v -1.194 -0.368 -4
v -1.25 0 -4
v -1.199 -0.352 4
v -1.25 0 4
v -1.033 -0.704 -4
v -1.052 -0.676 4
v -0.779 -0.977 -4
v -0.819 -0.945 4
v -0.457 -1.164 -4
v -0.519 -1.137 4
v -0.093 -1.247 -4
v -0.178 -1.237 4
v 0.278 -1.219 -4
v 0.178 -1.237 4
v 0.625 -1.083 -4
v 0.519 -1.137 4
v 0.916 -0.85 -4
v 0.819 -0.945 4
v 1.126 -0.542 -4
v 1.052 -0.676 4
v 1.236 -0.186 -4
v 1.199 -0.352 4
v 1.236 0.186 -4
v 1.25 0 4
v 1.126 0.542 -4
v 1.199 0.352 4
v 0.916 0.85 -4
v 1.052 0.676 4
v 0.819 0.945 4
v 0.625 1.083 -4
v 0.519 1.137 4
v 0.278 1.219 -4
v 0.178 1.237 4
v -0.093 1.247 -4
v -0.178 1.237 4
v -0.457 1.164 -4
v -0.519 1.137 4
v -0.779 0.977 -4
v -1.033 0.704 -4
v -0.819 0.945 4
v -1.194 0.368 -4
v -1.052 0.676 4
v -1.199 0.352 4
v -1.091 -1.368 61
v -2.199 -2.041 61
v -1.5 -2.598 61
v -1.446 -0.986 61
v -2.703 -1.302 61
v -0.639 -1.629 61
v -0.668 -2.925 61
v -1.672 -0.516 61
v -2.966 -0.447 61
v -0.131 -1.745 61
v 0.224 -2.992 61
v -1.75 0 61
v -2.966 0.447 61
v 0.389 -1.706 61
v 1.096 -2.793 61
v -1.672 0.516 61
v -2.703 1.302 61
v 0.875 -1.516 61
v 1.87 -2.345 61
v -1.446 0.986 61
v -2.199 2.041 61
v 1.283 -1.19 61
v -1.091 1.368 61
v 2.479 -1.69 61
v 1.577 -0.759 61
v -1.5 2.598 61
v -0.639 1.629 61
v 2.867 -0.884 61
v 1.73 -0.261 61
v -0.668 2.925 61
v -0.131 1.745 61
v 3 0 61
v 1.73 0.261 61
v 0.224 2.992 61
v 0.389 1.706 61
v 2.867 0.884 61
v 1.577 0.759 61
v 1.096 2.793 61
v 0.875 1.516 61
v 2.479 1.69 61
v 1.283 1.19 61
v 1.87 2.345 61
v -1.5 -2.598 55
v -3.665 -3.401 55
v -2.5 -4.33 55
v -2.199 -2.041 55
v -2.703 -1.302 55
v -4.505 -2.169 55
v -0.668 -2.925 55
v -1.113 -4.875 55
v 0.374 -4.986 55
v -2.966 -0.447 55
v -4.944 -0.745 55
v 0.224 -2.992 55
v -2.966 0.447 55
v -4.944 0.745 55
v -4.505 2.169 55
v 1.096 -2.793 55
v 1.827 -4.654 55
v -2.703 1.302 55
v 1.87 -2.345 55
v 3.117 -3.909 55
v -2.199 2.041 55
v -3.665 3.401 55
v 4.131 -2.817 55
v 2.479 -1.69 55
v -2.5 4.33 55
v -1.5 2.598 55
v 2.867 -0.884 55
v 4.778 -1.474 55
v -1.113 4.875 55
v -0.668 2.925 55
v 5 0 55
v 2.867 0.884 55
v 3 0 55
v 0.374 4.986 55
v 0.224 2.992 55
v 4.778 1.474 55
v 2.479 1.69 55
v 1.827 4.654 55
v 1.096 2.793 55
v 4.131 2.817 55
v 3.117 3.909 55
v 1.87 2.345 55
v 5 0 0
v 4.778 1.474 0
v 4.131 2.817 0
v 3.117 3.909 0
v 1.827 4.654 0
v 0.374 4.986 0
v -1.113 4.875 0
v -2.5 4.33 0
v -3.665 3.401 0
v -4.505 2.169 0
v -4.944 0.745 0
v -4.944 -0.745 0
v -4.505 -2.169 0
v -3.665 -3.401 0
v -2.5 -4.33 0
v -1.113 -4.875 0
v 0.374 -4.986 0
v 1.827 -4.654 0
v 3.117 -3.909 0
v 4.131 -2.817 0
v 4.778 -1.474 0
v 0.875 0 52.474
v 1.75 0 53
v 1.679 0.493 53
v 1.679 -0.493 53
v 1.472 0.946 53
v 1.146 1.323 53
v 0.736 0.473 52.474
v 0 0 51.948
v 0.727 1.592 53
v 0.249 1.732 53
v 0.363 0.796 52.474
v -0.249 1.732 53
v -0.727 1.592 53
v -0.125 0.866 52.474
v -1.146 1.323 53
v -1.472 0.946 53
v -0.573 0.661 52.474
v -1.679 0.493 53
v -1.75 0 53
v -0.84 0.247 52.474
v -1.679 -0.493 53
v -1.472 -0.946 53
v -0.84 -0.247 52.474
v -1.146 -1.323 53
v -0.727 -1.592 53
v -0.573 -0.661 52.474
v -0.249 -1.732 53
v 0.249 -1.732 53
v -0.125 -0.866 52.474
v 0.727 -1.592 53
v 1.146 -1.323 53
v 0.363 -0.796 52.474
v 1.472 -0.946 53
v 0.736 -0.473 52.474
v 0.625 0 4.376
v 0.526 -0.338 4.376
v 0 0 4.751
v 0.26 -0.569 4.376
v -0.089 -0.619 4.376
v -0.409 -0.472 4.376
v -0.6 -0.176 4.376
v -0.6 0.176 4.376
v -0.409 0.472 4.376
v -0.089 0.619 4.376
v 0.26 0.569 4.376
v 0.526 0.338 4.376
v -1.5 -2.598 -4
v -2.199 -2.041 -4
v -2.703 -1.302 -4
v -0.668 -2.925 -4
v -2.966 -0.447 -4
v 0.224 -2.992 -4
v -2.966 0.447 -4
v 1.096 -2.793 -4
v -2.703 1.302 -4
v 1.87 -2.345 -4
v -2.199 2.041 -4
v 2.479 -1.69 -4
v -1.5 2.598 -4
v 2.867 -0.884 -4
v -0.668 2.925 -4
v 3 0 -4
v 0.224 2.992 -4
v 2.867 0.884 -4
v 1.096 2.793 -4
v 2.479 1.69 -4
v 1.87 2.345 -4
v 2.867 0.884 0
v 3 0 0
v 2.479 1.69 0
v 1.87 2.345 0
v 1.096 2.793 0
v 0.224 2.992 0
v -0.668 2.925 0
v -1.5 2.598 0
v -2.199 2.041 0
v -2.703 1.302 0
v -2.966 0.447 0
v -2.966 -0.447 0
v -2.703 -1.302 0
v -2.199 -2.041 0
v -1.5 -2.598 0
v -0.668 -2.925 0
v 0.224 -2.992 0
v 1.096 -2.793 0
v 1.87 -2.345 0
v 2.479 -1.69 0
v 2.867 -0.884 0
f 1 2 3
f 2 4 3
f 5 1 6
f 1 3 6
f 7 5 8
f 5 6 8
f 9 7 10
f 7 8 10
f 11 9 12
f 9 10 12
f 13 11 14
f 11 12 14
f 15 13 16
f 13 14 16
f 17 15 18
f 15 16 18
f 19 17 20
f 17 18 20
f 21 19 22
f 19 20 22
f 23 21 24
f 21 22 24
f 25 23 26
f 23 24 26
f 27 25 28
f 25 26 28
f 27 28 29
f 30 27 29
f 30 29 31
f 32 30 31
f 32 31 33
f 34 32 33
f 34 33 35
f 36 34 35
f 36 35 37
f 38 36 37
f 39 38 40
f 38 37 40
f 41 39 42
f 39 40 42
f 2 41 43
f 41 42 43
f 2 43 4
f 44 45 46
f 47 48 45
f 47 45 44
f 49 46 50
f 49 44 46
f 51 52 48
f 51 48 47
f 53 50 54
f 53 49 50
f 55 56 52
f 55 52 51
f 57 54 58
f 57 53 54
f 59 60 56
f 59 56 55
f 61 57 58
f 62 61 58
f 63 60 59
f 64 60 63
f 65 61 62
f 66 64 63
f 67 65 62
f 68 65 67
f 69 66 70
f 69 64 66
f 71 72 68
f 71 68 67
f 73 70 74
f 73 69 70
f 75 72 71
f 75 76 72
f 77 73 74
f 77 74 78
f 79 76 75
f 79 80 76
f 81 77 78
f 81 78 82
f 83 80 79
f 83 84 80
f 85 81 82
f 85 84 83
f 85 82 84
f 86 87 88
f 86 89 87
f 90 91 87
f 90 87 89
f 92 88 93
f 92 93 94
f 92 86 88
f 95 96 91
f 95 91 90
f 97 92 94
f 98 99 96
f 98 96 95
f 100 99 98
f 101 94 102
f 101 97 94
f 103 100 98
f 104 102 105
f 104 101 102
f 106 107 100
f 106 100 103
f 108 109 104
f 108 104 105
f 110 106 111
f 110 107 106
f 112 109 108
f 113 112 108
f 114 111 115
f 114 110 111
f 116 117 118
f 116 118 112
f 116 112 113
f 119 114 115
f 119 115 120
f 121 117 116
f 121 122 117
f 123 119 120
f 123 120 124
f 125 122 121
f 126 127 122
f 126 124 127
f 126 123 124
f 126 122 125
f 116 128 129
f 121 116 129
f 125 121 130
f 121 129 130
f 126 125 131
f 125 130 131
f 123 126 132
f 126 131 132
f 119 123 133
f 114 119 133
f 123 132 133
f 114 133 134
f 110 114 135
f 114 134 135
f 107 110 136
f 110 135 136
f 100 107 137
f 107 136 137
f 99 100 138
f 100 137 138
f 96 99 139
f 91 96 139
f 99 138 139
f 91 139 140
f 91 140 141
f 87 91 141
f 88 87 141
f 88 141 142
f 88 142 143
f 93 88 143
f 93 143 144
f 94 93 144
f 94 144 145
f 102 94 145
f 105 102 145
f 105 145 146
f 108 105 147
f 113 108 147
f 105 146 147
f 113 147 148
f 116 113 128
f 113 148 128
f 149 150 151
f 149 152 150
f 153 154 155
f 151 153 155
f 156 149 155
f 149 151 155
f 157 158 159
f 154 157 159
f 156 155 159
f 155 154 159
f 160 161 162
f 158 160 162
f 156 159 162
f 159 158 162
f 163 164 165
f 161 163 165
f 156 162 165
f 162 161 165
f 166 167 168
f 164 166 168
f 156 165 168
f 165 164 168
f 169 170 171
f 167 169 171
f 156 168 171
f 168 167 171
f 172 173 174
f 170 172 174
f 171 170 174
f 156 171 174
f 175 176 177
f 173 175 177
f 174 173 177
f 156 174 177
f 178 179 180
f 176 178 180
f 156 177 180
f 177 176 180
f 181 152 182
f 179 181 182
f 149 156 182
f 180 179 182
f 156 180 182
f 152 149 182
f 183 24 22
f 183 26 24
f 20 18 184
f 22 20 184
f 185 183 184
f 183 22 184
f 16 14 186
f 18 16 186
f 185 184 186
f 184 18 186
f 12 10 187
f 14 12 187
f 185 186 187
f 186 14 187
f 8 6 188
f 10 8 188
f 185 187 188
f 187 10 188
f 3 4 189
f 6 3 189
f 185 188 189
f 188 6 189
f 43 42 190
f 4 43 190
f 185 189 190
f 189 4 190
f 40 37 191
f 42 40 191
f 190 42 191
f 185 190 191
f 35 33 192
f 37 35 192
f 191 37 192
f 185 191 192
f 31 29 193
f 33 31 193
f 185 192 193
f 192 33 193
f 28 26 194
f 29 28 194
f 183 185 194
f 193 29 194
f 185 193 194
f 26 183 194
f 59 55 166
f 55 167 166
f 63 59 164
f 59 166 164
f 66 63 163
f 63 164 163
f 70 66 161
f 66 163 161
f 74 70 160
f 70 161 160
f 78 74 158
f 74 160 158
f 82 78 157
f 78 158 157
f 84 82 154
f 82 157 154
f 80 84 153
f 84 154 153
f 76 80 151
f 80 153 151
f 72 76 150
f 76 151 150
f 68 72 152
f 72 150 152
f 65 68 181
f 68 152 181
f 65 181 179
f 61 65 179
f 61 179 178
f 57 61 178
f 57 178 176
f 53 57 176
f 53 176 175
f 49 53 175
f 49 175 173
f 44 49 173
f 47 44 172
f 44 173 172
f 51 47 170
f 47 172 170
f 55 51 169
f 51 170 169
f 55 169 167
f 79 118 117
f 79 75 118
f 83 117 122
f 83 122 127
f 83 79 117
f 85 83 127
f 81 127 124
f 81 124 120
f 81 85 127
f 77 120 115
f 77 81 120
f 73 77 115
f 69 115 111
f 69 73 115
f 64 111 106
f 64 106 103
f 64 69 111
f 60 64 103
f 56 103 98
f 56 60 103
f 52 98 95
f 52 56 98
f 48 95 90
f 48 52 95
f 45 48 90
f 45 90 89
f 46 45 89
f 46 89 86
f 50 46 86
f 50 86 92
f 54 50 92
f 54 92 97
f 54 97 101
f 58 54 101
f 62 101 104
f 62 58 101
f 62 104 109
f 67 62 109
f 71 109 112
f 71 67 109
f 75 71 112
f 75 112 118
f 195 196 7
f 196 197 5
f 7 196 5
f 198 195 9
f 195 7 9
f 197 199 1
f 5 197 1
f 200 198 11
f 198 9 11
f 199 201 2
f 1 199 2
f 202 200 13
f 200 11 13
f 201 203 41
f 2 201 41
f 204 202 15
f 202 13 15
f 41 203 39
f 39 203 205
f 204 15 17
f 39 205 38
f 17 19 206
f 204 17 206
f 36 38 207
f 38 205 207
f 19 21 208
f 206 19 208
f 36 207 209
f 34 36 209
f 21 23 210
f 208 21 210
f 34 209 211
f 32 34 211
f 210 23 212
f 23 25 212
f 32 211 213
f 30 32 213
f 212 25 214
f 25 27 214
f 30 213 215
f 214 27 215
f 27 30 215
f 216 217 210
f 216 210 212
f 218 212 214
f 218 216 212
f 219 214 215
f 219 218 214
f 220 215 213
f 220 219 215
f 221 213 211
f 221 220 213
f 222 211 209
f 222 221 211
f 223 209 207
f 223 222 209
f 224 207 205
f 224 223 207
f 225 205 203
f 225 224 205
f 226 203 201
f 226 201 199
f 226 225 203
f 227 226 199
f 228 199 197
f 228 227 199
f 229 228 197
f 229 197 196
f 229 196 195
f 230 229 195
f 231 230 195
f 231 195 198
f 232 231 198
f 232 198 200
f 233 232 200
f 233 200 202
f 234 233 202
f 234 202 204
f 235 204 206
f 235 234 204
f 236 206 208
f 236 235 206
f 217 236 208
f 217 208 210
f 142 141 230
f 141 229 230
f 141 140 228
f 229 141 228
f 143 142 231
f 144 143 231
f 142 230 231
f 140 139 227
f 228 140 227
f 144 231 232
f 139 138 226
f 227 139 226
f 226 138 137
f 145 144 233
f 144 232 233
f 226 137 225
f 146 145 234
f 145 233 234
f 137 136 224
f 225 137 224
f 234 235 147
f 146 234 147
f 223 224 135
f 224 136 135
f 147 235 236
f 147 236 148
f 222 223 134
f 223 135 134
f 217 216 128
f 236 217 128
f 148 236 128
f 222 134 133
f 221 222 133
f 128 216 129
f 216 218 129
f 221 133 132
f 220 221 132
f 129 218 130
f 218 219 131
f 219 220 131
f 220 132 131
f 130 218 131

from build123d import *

# Parameters (mm, degrees)
F0_R          = 3
F1_DEPTH      = 61
F1_DEPTH_BACK = 4
F0_R_2        = 5
F2_DEPTH      = 55
F5_D          = 2.5
F5_DEPTH      = 8
F5_TIP        = 0.7510757738
F6_D          = 3.5
F6_DEPTH      = 8
F6_TIP        = 1.0515060833


with BuildPart() as f1:
    # F0 (on Top) → F1 (new body, two sides)
    with BuildSketch(Plane.XY) as f1_sk:
        Circle(F0_R)
    extrude(amount=F1_DEPTH)
    extrude(f1_sk.sketch, amount=-F1_DEPTH_BACK)

    # F0 (on Top) → F2 (join)
    with BuildSketch(Plane.XY):
        Circle(F0_R_2)
        Circle(F0_R, mode=Mode.SUBTRACT)
    extrude(amount=F2_DEPTH)

    # F5
    with Locations(Plane(origin=(0, 0, -4), x_dir=(1, 0, 0), z_dir=(0, 0, -1))):
        with Locations((0, 0)):
            Hole(F5_D / 2, depth=F5_DEPTH)
            with Locations((0, 0, -(F5_DEPTH + F5_TIP / 2))):  # 118° drill point
                Cone(0, F5_D / 2, F5_TIP, mode=Mode.SUBTRACT)

    # F6
    with Locations(Plane.XY.offset(61)):
        with Locations((0, 0)):
            Hole(F6_D / 2, depth=F6_DEPTH)
            with Locations((0, 0, -(F6_DEPTH + F6_TIP / 2))):  # 118° drill point
                Cone(0, F6_D / 2, F6_TIP, mode=Mode.SUBTRACT)


solid = f1.part
